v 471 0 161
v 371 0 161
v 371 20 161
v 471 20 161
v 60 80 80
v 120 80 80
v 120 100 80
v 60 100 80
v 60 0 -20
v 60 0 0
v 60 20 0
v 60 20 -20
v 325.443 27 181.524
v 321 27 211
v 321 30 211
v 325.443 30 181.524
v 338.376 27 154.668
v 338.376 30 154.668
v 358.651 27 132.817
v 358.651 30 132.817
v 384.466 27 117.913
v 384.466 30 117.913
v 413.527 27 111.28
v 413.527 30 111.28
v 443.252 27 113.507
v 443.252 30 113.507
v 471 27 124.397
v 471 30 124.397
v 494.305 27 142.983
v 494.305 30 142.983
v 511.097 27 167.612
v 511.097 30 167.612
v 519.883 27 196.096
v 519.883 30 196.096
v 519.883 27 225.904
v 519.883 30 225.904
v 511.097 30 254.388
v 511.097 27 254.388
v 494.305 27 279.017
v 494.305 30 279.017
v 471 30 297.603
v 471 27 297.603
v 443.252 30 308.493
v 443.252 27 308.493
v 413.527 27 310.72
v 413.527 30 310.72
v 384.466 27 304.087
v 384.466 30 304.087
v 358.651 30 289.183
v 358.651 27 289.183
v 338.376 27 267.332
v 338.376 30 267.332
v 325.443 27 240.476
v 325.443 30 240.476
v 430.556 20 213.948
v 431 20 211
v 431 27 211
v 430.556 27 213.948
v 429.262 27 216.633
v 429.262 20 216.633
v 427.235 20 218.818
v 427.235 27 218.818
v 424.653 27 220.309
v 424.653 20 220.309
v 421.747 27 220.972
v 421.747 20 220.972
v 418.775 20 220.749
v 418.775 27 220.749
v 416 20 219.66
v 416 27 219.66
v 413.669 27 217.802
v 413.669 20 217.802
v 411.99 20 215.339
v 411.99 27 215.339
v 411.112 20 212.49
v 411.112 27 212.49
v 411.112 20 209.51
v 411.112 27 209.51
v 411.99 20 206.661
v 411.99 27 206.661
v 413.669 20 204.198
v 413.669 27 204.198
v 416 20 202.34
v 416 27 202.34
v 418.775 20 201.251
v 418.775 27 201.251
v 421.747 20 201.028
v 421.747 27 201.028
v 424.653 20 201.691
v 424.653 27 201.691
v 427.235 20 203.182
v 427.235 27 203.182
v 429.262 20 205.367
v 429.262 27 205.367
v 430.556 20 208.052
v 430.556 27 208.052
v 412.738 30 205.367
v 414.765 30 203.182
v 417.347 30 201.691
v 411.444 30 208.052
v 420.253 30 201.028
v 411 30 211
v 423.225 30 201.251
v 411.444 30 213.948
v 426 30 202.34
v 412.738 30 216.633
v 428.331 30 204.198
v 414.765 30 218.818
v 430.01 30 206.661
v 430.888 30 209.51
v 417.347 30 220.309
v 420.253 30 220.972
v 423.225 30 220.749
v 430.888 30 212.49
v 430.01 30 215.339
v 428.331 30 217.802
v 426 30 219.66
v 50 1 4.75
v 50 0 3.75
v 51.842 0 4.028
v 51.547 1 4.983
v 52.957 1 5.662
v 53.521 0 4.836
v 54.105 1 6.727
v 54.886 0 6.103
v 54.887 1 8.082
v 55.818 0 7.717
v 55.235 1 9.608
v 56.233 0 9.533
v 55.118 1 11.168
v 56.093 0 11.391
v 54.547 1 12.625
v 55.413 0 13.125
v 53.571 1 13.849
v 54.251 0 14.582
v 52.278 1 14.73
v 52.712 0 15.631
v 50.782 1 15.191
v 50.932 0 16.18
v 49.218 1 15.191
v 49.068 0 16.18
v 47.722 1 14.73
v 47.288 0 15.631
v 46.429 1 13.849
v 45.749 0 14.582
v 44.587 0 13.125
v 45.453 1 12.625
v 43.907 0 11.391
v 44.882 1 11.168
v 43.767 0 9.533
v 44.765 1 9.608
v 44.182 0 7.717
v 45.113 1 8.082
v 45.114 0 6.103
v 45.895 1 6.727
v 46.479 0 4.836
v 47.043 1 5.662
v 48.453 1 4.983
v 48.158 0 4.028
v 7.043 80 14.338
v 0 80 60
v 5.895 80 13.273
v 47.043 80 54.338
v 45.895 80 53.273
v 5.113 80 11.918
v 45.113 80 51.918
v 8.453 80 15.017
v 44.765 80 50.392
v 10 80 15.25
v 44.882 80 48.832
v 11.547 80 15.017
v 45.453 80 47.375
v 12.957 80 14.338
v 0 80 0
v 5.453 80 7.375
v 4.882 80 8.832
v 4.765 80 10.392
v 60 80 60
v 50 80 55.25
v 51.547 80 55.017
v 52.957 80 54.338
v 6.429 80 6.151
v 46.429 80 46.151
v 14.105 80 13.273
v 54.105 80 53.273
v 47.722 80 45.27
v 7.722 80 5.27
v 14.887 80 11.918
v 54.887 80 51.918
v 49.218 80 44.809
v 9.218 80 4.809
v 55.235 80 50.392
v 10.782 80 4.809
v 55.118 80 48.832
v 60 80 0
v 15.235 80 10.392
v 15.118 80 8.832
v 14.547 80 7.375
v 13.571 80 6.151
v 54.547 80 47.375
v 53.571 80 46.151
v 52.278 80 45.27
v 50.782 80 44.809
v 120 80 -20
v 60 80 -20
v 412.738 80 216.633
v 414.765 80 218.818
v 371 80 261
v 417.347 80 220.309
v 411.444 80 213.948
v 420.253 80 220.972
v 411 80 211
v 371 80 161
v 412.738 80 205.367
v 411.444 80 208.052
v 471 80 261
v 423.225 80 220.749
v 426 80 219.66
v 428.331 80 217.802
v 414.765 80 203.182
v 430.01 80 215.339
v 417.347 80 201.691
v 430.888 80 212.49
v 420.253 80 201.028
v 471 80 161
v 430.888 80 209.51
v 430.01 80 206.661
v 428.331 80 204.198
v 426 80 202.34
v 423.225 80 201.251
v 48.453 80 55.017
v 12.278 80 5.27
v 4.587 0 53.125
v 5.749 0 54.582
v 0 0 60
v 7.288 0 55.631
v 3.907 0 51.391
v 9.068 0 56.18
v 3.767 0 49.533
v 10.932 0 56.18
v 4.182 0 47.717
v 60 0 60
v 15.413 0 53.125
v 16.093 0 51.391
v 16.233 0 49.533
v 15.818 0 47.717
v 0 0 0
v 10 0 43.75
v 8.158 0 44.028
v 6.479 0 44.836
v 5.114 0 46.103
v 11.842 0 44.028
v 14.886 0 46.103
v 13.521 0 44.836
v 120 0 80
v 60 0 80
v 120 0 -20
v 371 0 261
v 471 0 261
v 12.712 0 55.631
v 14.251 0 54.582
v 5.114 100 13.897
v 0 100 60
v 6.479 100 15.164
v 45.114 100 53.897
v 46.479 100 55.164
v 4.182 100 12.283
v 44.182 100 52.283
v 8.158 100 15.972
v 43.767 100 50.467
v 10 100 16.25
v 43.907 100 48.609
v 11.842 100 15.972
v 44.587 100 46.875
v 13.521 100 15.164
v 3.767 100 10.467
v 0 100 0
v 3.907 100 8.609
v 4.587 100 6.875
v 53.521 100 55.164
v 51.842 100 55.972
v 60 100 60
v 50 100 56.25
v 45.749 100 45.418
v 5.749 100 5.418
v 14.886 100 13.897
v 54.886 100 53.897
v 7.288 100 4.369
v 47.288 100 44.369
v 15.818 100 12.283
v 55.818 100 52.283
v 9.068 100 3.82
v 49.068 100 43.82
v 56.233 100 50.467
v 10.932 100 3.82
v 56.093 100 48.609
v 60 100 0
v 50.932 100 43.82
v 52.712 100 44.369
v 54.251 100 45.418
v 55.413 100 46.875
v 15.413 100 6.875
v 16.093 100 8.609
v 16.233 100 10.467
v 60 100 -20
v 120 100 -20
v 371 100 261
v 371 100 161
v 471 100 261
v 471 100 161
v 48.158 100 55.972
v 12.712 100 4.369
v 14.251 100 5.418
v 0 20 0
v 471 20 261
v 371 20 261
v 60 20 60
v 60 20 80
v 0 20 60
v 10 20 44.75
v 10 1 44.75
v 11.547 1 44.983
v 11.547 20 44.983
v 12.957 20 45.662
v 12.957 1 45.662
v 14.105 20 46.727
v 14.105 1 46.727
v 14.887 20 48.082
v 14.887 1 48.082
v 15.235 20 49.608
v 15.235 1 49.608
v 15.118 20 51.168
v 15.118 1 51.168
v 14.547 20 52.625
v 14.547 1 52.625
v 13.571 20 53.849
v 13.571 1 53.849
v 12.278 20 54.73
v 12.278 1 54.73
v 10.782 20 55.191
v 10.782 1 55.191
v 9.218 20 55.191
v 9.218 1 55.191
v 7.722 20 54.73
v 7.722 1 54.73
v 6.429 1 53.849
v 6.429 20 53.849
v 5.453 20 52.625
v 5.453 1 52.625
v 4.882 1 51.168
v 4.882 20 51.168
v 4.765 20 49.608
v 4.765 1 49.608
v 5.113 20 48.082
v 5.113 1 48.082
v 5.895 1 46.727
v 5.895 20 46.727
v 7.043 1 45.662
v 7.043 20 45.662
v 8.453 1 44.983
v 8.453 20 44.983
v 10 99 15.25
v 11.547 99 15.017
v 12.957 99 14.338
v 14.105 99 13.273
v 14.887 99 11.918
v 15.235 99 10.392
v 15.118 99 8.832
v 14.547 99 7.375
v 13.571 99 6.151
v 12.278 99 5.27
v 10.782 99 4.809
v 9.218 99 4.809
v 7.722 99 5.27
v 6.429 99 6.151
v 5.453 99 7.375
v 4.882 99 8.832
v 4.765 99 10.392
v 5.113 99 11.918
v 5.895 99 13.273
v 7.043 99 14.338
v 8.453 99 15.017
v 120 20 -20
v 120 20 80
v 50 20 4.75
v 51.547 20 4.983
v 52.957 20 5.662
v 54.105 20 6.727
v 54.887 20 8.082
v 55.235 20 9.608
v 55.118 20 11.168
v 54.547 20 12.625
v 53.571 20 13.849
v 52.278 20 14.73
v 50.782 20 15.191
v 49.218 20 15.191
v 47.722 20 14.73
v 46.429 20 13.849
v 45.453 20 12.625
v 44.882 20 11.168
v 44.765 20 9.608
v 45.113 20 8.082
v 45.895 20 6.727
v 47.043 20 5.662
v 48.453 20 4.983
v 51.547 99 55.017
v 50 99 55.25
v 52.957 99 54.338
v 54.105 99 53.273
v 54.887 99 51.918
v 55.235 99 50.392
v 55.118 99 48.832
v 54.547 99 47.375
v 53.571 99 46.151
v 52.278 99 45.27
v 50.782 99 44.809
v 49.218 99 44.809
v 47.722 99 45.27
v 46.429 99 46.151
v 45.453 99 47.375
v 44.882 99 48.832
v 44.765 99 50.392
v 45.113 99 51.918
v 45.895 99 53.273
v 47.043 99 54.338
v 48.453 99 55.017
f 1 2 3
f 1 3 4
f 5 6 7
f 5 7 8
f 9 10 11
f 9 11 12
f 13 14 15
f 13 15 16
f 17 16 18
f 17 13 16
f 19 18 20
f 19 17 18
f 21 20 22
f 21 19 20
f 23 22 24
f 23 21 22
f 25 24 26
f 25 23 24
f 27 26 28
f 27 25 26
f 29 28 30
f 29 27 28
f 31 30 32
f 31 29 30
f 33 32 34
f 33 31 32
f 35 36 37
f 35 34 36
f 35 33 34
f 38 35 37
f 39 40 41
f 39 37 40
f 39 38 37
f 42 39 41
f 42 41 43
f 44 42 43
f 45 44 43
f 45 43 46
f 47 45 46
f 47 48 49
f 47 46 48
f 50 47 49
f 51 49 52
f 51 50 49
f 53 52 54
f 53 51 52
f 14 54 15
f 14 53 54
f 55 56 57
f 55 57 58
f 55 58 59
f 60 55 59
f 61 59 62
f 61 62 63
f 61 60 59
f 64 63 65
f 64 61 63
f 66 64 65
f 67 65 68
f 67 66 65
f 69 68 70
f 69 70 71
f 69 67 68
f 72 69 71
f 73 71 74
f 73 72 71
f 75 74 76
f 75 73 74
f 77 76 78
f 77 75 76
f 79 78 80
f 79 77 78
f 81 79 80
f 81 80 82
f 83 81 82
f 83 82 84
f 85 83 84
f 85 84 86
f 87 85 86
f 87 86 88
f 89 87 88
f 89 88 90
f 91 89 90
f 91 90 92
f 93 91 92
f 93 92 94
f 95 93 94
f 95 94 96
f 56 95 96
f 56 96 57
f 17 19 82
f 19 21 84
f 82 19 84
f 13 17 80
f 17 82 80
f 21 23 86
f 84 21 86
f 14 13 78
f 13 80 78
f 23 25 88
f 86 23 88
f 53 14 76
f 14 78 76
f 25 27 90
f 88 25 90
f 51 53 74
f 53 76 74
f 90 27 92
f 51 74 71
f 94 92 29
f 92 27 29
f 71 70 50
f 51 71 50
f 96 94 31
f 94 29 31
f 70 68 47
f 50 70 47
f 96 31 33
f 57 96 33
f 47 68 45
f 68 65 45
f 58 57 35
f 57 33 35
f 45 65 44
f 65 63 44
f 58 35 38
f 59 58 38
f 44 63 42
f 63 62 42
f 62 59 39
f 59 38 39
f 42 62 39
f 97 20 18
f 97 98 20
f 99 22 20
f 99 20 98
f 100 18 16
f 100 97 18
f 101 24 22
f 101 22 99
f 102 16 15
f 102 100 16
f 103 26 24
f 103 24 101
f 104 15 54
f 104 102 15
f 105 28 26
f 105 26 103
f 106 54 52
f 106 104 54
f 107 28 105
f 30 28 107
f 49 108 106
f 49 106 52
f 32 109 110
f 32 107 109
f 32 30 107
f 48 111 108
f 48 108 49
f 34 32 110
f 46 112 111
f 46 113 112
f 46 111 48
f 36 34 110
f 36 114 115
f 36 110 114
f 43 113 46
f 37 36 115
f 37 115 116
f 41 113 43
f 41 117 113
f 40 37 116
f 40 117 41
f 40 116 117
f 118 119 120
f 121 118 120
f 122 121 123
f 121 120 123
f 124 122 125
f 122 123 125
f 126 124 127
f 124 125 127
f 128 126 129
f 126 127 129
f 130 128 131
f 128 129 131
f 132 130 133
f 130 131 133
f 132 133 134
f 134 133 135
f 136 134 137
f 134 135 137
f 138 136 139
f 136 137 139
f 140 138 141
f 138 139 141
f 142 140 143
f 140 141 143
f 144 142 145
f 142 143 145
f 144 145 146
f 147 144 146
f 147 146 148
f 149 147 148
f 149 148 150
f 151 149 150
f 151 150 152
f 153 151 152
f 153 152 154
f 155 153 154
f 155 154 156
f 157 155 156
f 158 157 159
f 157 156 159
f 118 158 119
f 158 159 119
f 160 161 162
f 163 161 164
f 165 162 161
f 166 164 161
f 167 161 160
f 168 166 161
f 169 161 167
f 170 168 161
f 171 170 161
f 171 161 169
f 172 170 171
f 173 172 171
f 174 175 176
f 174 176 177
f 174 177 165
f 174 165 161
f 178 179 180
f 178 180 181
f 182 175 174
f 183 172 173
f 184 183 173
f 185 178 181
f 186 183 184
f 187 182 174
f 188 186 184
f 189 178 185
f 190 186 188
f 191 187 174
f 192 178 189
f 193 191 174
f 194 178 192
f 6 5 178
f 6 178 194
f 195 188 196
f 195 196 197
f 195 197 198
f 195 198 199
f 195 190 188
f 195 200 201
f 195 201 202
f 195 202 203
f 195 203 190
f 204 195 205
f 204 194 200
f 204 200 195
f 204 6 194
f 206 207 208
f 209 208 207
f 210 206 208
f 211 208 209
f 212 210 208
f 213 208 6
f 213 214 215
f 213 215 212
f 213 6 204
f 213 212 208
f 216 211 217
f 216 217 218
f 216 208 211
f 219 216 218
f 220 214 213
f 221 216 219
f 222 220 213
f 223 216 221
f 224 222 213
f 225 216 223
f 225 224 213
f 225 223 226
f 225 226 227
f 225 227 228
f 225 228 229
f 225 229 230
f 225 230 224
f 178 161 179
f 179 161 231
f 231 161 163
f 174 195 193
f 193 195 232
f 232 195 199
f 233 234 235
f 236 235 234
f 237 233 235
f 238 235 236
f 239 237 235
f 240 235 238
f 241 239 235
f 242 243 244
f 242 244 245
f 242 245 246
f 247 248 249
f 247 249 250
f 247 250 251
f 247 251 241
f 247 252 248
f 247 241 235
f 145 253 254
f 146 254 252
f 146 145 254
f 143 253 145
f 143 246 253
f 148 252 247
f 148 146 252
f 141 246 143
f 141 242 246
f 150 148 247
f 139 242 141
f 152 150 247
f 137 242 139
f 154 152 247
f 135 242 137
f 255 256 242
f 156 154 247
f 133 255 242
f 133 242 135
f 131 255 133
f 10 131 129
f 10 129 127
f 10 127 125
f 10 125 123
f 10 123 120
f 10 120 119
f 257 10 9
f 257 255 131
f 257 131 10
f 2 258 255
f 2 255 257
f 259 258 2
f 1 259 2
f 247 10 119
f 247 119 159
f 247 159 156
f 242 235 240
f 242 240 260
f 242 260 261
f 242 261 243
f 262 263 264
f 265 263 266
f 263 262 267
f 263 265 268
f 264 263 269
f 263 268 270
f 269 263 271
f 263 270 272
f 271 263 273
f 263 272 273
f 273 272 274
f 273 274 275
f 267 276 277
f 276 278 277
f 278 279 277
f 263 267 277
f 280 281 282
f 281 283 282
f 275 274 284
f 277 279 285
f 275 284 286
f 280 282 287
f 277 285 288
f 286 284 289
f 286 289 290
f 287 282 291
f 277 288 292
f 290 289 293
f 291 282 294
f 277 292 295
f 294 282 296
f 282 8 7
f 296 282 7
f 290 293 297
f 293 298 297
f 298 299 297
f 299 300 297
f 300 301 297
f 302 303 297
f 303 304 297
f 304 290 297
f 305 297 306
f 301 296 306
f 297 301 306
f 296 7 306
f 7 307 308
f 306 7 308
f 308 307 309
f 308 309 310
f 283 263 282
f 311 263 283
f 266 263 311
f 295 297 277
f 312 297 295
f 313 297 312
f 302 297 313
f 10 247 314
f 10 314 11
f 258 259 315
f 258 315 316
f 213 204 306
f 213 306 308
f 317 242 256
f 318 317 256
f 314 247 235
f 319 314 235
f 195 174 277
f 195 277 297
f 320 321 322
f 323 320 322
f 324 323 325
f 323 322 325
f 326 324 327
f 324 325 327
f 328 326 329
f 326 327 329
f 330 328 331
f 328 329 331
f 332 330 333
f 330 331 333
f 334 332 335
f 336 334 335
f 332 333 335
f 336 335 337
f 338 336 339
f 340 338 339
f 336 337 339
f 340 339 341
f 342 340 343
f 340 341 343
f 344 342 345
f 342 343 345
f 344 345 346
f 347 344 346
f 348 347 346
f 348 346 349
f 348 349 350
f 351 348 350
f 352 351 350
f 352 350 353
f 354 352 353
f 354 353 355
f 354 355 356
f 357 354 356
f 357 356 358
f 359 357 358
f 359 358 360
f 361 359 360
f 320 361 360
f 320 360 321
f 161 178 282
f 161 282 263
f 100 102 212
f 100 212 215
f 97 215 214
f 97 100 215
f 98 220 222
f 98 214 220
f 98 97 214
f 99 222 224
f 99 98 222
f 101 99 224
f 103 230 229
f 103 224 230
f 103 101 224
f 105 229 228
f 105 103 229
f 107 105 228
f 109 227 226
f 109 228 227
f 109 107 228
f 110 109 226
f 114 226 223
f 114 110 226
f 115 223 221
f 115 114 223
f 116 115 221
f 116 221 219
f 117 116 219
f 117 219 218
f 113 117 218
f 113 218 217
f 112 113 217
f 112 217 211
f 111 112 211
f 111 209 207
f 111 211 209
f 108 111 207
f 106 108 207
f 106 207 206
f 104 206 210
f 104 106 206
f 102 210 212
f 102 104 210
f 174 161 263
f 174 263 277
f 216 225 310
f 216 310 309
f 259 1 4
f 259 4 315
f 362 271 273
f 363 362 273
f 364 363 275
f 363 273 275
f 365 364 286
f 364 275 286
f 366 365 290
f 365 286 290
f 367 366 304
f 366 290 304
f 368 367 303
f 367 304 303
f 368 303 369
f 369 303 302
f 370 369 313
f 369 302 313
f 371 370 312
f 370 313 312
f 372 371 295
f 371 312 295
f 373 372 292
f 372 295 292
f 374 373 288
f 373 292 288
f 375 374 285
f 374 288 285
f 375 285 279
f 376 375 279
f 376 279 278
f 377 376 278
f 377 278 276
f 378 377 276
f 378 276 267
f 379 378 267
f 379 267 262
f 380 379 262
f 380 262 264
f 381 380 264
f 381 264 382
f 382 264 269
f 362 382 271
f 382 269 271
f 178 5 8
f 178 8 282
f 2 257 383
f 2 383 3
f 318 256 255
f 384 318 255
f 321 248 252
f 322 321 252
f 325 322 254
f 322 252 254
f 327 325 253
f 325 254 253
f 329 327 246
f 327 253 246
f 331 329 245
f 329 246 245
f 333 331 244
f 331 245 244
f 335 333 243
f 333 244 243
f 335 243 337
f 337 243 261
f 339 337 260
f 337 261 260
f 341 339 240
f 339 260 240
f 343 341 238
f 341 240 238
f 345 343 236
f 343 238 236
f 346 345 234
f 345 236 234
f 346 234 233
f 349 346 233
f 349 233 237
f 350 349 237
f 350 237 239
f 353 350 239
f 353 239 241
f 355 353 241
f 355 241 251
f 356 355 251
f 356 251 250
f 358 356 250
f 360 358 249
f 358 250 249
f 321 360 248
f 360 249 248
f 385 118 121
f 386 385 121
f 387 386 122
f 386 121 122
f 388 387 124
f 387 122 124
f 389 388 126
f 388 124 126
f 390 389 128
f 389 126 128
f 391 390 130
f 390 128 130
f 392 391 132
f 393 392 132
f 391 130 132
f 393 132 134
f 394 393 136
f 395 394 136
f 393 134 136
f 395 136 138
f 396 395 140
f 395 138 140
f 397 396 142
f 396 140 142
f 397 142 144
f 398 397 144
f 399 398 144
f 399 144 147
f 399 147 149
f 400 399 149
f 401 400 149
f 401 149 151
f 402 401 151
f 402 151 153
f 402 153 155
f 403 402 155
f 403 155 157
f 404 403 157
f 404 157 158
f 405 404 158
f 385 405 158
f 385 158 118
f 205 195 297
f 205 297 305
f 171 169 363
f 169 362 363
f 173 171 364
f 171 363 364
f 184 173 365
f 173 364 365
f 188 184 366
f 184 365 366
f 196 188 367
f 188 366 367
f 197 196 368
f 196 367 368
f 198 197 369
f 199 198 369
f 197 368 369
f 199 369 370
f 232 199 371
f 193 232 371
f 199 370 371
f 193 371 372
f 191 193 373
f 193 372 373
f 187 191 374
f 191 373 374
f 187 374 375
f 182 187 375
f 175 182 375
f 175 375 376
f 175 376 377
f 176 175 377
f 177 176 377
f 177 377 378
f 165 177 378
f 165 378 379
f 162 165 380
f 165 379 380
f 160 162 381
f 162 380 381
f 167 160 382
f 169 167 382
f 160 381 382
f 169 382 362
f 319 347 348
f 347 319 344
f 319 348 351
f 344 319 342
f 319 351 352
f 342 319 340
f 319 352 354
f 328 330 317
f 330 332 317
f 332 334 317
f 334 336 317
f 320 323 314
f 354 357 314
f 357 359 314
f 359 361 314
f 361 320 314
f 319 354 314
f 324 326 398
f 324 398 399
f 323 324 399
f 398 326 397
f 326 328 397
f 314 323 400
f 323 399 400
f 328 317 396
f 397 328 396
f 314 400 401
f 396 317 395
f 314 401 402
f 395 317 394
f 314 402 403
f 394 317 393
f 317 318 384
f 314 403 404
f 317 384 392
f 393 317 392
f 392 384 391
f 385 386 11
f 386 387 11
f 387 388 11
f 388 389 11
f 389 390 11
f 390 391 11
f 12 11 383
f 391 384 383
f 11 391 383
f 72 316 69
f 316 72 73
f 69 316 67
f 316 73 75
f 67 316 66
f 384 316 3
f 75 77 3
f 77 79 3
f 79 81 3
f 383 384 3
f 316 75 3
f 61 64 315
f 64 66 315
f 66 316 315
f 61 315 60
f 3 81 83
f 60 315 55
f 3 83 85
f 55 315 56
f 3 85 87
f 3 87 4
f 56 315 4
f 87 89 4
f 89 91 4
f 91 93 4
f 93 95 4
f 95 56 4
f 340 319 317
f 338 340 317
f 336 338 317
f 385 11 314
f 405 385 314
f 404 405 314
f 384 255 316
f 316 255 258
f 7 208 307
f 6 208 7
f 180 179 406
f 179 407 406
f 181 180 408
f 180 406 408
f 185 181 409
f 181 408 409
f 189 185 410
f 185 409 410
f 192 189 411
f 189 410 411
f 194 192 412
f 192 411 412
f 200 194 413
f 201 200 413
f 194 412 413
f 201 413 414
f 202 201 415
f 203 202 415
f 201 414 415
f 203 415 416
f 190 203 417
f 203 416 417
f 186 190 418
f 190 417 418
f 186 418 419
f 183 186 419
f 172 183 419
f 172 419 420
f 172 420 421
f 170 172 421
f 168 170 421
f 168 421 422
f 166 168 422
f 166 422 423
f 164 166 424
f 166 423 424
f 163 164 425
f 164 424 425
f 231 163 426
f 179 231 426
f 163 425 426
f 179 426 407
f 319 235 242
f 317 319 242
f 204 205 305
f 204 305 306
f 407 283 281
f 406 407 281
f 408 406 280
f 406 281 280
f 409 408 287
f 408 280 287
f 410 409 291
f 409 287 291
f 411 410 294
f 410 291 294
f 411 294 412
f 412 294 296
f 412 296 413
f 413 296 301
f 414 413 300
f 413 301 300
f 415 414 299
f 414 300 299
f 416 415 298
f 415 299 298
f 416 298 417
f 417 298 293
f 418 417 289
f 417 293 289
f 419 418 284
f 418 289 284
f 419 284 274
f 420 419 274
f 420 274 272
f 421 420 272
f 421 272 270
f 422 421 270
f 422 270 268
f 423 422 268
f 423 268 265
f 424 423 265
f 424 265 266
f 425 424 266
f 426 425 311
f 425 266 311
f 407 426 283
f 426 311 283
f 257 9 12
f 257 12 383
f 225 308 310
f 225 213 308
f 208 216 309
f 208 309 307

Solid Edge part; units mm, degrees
sketch "Sketch1" plane through (0, 0, 0) normal (0, -1, 0) x (1, 0, 0)
  line L0 (471, 261) -> (371, 261)
  line L1 (120, 80) -> (371, 261)
  line L2 (60, 80) -> (120, 80)
  line L3 (60, 60) -> (60, 80)
  line L4 (0, 60) -> (60, 60)
  line L5 (0, 0) -> (0, 60)
  line L6 (0, 0) -> (60, 0)
  line L7 (60, 0) -> (60, -20)
  line L8 (60, -20) -> (120, -20)
  line L9 (120, -20) -> (371, 161)
  line L10 (371, 161) -> (471, 161)
  line L11 (471, 161) -> (471, 261)
extrude "Protrusion1" add sketch "Sketch1" against normal blind 20
sketch "Sketch2" plane through (371, 20, 161) normal (0, -1, 0) x (1, 0, 0)
  circle A0 centre (50, 50) radius 10
extrude "Extrusionsausprägung_2" add sketch "Sketch2" against normal blind 7
sketch "Sketch3" plane through (421, 27, 211) normal (0, 1, 0) x (-1, 0, 0)
  circle A0 centre (0, 0) radius 100
extrude "Extrusionsausprägung_4" add sketch "Sketch3" along normal blind 3
sketch "Sketch4" plane through (421, 30, 211) normal (0, 1, 0) x (-1, 0, 0)
  circle A0 centre (0, 0) radius 10
extrude "Extrusionsausprägung_5" add sketch "Sketch4" along normal blind 50
sketch "Sketch5" plane through (421, 80, 211) normal (0, 1, 0) x (-1, 0, 0)
  line L0 (50, 50) -> (301, -131)
  line L1 (301, -131) -> (361, -131)
  line L2 (361, -131) -> (361, -151)
  line L3 (361, -151) -> (421, -151)
  line L4 (421, -151) -> (421, -211)
  line L5 (421, -211) -> (361, -211)
  line L6 (361, -211) -> (361, -231)
  line L7 (361, -231) -> (301, -231)
  line L8 (301, -231) -> (50, -50)
  line L9 (50, -50) -> (-50, -50)
  line L10 (-50, -50) -> (-50, 50)
  line L11 (-50, 50) -> (50, 50)
extrude "Extrusionsausprägung_6" add sketch "Sketch5" along normal blind 20
hole "Bohrung_1" at (10, 0, 50) direction (0, 1, 0) diameter 10.5 end up to next start chamfer 1 start chamfer angle 45
hole "Hole1" at (50, 0, 10) direction (0, 1, 0) diameter 10.5 end up to next start chamfer 1 start chamfer angle 45
hole "Bohrung_3" at (50, 100, 50) direction (0, -1, 0) diameter 10.5 end up to next start chamfer 1 start chamfer angle 45
hole "Hole2" at (10, 100, 10) direction (0, -1, 0) diameter 10.5 end up to next start chamfer 1 start chamfer angle 45
